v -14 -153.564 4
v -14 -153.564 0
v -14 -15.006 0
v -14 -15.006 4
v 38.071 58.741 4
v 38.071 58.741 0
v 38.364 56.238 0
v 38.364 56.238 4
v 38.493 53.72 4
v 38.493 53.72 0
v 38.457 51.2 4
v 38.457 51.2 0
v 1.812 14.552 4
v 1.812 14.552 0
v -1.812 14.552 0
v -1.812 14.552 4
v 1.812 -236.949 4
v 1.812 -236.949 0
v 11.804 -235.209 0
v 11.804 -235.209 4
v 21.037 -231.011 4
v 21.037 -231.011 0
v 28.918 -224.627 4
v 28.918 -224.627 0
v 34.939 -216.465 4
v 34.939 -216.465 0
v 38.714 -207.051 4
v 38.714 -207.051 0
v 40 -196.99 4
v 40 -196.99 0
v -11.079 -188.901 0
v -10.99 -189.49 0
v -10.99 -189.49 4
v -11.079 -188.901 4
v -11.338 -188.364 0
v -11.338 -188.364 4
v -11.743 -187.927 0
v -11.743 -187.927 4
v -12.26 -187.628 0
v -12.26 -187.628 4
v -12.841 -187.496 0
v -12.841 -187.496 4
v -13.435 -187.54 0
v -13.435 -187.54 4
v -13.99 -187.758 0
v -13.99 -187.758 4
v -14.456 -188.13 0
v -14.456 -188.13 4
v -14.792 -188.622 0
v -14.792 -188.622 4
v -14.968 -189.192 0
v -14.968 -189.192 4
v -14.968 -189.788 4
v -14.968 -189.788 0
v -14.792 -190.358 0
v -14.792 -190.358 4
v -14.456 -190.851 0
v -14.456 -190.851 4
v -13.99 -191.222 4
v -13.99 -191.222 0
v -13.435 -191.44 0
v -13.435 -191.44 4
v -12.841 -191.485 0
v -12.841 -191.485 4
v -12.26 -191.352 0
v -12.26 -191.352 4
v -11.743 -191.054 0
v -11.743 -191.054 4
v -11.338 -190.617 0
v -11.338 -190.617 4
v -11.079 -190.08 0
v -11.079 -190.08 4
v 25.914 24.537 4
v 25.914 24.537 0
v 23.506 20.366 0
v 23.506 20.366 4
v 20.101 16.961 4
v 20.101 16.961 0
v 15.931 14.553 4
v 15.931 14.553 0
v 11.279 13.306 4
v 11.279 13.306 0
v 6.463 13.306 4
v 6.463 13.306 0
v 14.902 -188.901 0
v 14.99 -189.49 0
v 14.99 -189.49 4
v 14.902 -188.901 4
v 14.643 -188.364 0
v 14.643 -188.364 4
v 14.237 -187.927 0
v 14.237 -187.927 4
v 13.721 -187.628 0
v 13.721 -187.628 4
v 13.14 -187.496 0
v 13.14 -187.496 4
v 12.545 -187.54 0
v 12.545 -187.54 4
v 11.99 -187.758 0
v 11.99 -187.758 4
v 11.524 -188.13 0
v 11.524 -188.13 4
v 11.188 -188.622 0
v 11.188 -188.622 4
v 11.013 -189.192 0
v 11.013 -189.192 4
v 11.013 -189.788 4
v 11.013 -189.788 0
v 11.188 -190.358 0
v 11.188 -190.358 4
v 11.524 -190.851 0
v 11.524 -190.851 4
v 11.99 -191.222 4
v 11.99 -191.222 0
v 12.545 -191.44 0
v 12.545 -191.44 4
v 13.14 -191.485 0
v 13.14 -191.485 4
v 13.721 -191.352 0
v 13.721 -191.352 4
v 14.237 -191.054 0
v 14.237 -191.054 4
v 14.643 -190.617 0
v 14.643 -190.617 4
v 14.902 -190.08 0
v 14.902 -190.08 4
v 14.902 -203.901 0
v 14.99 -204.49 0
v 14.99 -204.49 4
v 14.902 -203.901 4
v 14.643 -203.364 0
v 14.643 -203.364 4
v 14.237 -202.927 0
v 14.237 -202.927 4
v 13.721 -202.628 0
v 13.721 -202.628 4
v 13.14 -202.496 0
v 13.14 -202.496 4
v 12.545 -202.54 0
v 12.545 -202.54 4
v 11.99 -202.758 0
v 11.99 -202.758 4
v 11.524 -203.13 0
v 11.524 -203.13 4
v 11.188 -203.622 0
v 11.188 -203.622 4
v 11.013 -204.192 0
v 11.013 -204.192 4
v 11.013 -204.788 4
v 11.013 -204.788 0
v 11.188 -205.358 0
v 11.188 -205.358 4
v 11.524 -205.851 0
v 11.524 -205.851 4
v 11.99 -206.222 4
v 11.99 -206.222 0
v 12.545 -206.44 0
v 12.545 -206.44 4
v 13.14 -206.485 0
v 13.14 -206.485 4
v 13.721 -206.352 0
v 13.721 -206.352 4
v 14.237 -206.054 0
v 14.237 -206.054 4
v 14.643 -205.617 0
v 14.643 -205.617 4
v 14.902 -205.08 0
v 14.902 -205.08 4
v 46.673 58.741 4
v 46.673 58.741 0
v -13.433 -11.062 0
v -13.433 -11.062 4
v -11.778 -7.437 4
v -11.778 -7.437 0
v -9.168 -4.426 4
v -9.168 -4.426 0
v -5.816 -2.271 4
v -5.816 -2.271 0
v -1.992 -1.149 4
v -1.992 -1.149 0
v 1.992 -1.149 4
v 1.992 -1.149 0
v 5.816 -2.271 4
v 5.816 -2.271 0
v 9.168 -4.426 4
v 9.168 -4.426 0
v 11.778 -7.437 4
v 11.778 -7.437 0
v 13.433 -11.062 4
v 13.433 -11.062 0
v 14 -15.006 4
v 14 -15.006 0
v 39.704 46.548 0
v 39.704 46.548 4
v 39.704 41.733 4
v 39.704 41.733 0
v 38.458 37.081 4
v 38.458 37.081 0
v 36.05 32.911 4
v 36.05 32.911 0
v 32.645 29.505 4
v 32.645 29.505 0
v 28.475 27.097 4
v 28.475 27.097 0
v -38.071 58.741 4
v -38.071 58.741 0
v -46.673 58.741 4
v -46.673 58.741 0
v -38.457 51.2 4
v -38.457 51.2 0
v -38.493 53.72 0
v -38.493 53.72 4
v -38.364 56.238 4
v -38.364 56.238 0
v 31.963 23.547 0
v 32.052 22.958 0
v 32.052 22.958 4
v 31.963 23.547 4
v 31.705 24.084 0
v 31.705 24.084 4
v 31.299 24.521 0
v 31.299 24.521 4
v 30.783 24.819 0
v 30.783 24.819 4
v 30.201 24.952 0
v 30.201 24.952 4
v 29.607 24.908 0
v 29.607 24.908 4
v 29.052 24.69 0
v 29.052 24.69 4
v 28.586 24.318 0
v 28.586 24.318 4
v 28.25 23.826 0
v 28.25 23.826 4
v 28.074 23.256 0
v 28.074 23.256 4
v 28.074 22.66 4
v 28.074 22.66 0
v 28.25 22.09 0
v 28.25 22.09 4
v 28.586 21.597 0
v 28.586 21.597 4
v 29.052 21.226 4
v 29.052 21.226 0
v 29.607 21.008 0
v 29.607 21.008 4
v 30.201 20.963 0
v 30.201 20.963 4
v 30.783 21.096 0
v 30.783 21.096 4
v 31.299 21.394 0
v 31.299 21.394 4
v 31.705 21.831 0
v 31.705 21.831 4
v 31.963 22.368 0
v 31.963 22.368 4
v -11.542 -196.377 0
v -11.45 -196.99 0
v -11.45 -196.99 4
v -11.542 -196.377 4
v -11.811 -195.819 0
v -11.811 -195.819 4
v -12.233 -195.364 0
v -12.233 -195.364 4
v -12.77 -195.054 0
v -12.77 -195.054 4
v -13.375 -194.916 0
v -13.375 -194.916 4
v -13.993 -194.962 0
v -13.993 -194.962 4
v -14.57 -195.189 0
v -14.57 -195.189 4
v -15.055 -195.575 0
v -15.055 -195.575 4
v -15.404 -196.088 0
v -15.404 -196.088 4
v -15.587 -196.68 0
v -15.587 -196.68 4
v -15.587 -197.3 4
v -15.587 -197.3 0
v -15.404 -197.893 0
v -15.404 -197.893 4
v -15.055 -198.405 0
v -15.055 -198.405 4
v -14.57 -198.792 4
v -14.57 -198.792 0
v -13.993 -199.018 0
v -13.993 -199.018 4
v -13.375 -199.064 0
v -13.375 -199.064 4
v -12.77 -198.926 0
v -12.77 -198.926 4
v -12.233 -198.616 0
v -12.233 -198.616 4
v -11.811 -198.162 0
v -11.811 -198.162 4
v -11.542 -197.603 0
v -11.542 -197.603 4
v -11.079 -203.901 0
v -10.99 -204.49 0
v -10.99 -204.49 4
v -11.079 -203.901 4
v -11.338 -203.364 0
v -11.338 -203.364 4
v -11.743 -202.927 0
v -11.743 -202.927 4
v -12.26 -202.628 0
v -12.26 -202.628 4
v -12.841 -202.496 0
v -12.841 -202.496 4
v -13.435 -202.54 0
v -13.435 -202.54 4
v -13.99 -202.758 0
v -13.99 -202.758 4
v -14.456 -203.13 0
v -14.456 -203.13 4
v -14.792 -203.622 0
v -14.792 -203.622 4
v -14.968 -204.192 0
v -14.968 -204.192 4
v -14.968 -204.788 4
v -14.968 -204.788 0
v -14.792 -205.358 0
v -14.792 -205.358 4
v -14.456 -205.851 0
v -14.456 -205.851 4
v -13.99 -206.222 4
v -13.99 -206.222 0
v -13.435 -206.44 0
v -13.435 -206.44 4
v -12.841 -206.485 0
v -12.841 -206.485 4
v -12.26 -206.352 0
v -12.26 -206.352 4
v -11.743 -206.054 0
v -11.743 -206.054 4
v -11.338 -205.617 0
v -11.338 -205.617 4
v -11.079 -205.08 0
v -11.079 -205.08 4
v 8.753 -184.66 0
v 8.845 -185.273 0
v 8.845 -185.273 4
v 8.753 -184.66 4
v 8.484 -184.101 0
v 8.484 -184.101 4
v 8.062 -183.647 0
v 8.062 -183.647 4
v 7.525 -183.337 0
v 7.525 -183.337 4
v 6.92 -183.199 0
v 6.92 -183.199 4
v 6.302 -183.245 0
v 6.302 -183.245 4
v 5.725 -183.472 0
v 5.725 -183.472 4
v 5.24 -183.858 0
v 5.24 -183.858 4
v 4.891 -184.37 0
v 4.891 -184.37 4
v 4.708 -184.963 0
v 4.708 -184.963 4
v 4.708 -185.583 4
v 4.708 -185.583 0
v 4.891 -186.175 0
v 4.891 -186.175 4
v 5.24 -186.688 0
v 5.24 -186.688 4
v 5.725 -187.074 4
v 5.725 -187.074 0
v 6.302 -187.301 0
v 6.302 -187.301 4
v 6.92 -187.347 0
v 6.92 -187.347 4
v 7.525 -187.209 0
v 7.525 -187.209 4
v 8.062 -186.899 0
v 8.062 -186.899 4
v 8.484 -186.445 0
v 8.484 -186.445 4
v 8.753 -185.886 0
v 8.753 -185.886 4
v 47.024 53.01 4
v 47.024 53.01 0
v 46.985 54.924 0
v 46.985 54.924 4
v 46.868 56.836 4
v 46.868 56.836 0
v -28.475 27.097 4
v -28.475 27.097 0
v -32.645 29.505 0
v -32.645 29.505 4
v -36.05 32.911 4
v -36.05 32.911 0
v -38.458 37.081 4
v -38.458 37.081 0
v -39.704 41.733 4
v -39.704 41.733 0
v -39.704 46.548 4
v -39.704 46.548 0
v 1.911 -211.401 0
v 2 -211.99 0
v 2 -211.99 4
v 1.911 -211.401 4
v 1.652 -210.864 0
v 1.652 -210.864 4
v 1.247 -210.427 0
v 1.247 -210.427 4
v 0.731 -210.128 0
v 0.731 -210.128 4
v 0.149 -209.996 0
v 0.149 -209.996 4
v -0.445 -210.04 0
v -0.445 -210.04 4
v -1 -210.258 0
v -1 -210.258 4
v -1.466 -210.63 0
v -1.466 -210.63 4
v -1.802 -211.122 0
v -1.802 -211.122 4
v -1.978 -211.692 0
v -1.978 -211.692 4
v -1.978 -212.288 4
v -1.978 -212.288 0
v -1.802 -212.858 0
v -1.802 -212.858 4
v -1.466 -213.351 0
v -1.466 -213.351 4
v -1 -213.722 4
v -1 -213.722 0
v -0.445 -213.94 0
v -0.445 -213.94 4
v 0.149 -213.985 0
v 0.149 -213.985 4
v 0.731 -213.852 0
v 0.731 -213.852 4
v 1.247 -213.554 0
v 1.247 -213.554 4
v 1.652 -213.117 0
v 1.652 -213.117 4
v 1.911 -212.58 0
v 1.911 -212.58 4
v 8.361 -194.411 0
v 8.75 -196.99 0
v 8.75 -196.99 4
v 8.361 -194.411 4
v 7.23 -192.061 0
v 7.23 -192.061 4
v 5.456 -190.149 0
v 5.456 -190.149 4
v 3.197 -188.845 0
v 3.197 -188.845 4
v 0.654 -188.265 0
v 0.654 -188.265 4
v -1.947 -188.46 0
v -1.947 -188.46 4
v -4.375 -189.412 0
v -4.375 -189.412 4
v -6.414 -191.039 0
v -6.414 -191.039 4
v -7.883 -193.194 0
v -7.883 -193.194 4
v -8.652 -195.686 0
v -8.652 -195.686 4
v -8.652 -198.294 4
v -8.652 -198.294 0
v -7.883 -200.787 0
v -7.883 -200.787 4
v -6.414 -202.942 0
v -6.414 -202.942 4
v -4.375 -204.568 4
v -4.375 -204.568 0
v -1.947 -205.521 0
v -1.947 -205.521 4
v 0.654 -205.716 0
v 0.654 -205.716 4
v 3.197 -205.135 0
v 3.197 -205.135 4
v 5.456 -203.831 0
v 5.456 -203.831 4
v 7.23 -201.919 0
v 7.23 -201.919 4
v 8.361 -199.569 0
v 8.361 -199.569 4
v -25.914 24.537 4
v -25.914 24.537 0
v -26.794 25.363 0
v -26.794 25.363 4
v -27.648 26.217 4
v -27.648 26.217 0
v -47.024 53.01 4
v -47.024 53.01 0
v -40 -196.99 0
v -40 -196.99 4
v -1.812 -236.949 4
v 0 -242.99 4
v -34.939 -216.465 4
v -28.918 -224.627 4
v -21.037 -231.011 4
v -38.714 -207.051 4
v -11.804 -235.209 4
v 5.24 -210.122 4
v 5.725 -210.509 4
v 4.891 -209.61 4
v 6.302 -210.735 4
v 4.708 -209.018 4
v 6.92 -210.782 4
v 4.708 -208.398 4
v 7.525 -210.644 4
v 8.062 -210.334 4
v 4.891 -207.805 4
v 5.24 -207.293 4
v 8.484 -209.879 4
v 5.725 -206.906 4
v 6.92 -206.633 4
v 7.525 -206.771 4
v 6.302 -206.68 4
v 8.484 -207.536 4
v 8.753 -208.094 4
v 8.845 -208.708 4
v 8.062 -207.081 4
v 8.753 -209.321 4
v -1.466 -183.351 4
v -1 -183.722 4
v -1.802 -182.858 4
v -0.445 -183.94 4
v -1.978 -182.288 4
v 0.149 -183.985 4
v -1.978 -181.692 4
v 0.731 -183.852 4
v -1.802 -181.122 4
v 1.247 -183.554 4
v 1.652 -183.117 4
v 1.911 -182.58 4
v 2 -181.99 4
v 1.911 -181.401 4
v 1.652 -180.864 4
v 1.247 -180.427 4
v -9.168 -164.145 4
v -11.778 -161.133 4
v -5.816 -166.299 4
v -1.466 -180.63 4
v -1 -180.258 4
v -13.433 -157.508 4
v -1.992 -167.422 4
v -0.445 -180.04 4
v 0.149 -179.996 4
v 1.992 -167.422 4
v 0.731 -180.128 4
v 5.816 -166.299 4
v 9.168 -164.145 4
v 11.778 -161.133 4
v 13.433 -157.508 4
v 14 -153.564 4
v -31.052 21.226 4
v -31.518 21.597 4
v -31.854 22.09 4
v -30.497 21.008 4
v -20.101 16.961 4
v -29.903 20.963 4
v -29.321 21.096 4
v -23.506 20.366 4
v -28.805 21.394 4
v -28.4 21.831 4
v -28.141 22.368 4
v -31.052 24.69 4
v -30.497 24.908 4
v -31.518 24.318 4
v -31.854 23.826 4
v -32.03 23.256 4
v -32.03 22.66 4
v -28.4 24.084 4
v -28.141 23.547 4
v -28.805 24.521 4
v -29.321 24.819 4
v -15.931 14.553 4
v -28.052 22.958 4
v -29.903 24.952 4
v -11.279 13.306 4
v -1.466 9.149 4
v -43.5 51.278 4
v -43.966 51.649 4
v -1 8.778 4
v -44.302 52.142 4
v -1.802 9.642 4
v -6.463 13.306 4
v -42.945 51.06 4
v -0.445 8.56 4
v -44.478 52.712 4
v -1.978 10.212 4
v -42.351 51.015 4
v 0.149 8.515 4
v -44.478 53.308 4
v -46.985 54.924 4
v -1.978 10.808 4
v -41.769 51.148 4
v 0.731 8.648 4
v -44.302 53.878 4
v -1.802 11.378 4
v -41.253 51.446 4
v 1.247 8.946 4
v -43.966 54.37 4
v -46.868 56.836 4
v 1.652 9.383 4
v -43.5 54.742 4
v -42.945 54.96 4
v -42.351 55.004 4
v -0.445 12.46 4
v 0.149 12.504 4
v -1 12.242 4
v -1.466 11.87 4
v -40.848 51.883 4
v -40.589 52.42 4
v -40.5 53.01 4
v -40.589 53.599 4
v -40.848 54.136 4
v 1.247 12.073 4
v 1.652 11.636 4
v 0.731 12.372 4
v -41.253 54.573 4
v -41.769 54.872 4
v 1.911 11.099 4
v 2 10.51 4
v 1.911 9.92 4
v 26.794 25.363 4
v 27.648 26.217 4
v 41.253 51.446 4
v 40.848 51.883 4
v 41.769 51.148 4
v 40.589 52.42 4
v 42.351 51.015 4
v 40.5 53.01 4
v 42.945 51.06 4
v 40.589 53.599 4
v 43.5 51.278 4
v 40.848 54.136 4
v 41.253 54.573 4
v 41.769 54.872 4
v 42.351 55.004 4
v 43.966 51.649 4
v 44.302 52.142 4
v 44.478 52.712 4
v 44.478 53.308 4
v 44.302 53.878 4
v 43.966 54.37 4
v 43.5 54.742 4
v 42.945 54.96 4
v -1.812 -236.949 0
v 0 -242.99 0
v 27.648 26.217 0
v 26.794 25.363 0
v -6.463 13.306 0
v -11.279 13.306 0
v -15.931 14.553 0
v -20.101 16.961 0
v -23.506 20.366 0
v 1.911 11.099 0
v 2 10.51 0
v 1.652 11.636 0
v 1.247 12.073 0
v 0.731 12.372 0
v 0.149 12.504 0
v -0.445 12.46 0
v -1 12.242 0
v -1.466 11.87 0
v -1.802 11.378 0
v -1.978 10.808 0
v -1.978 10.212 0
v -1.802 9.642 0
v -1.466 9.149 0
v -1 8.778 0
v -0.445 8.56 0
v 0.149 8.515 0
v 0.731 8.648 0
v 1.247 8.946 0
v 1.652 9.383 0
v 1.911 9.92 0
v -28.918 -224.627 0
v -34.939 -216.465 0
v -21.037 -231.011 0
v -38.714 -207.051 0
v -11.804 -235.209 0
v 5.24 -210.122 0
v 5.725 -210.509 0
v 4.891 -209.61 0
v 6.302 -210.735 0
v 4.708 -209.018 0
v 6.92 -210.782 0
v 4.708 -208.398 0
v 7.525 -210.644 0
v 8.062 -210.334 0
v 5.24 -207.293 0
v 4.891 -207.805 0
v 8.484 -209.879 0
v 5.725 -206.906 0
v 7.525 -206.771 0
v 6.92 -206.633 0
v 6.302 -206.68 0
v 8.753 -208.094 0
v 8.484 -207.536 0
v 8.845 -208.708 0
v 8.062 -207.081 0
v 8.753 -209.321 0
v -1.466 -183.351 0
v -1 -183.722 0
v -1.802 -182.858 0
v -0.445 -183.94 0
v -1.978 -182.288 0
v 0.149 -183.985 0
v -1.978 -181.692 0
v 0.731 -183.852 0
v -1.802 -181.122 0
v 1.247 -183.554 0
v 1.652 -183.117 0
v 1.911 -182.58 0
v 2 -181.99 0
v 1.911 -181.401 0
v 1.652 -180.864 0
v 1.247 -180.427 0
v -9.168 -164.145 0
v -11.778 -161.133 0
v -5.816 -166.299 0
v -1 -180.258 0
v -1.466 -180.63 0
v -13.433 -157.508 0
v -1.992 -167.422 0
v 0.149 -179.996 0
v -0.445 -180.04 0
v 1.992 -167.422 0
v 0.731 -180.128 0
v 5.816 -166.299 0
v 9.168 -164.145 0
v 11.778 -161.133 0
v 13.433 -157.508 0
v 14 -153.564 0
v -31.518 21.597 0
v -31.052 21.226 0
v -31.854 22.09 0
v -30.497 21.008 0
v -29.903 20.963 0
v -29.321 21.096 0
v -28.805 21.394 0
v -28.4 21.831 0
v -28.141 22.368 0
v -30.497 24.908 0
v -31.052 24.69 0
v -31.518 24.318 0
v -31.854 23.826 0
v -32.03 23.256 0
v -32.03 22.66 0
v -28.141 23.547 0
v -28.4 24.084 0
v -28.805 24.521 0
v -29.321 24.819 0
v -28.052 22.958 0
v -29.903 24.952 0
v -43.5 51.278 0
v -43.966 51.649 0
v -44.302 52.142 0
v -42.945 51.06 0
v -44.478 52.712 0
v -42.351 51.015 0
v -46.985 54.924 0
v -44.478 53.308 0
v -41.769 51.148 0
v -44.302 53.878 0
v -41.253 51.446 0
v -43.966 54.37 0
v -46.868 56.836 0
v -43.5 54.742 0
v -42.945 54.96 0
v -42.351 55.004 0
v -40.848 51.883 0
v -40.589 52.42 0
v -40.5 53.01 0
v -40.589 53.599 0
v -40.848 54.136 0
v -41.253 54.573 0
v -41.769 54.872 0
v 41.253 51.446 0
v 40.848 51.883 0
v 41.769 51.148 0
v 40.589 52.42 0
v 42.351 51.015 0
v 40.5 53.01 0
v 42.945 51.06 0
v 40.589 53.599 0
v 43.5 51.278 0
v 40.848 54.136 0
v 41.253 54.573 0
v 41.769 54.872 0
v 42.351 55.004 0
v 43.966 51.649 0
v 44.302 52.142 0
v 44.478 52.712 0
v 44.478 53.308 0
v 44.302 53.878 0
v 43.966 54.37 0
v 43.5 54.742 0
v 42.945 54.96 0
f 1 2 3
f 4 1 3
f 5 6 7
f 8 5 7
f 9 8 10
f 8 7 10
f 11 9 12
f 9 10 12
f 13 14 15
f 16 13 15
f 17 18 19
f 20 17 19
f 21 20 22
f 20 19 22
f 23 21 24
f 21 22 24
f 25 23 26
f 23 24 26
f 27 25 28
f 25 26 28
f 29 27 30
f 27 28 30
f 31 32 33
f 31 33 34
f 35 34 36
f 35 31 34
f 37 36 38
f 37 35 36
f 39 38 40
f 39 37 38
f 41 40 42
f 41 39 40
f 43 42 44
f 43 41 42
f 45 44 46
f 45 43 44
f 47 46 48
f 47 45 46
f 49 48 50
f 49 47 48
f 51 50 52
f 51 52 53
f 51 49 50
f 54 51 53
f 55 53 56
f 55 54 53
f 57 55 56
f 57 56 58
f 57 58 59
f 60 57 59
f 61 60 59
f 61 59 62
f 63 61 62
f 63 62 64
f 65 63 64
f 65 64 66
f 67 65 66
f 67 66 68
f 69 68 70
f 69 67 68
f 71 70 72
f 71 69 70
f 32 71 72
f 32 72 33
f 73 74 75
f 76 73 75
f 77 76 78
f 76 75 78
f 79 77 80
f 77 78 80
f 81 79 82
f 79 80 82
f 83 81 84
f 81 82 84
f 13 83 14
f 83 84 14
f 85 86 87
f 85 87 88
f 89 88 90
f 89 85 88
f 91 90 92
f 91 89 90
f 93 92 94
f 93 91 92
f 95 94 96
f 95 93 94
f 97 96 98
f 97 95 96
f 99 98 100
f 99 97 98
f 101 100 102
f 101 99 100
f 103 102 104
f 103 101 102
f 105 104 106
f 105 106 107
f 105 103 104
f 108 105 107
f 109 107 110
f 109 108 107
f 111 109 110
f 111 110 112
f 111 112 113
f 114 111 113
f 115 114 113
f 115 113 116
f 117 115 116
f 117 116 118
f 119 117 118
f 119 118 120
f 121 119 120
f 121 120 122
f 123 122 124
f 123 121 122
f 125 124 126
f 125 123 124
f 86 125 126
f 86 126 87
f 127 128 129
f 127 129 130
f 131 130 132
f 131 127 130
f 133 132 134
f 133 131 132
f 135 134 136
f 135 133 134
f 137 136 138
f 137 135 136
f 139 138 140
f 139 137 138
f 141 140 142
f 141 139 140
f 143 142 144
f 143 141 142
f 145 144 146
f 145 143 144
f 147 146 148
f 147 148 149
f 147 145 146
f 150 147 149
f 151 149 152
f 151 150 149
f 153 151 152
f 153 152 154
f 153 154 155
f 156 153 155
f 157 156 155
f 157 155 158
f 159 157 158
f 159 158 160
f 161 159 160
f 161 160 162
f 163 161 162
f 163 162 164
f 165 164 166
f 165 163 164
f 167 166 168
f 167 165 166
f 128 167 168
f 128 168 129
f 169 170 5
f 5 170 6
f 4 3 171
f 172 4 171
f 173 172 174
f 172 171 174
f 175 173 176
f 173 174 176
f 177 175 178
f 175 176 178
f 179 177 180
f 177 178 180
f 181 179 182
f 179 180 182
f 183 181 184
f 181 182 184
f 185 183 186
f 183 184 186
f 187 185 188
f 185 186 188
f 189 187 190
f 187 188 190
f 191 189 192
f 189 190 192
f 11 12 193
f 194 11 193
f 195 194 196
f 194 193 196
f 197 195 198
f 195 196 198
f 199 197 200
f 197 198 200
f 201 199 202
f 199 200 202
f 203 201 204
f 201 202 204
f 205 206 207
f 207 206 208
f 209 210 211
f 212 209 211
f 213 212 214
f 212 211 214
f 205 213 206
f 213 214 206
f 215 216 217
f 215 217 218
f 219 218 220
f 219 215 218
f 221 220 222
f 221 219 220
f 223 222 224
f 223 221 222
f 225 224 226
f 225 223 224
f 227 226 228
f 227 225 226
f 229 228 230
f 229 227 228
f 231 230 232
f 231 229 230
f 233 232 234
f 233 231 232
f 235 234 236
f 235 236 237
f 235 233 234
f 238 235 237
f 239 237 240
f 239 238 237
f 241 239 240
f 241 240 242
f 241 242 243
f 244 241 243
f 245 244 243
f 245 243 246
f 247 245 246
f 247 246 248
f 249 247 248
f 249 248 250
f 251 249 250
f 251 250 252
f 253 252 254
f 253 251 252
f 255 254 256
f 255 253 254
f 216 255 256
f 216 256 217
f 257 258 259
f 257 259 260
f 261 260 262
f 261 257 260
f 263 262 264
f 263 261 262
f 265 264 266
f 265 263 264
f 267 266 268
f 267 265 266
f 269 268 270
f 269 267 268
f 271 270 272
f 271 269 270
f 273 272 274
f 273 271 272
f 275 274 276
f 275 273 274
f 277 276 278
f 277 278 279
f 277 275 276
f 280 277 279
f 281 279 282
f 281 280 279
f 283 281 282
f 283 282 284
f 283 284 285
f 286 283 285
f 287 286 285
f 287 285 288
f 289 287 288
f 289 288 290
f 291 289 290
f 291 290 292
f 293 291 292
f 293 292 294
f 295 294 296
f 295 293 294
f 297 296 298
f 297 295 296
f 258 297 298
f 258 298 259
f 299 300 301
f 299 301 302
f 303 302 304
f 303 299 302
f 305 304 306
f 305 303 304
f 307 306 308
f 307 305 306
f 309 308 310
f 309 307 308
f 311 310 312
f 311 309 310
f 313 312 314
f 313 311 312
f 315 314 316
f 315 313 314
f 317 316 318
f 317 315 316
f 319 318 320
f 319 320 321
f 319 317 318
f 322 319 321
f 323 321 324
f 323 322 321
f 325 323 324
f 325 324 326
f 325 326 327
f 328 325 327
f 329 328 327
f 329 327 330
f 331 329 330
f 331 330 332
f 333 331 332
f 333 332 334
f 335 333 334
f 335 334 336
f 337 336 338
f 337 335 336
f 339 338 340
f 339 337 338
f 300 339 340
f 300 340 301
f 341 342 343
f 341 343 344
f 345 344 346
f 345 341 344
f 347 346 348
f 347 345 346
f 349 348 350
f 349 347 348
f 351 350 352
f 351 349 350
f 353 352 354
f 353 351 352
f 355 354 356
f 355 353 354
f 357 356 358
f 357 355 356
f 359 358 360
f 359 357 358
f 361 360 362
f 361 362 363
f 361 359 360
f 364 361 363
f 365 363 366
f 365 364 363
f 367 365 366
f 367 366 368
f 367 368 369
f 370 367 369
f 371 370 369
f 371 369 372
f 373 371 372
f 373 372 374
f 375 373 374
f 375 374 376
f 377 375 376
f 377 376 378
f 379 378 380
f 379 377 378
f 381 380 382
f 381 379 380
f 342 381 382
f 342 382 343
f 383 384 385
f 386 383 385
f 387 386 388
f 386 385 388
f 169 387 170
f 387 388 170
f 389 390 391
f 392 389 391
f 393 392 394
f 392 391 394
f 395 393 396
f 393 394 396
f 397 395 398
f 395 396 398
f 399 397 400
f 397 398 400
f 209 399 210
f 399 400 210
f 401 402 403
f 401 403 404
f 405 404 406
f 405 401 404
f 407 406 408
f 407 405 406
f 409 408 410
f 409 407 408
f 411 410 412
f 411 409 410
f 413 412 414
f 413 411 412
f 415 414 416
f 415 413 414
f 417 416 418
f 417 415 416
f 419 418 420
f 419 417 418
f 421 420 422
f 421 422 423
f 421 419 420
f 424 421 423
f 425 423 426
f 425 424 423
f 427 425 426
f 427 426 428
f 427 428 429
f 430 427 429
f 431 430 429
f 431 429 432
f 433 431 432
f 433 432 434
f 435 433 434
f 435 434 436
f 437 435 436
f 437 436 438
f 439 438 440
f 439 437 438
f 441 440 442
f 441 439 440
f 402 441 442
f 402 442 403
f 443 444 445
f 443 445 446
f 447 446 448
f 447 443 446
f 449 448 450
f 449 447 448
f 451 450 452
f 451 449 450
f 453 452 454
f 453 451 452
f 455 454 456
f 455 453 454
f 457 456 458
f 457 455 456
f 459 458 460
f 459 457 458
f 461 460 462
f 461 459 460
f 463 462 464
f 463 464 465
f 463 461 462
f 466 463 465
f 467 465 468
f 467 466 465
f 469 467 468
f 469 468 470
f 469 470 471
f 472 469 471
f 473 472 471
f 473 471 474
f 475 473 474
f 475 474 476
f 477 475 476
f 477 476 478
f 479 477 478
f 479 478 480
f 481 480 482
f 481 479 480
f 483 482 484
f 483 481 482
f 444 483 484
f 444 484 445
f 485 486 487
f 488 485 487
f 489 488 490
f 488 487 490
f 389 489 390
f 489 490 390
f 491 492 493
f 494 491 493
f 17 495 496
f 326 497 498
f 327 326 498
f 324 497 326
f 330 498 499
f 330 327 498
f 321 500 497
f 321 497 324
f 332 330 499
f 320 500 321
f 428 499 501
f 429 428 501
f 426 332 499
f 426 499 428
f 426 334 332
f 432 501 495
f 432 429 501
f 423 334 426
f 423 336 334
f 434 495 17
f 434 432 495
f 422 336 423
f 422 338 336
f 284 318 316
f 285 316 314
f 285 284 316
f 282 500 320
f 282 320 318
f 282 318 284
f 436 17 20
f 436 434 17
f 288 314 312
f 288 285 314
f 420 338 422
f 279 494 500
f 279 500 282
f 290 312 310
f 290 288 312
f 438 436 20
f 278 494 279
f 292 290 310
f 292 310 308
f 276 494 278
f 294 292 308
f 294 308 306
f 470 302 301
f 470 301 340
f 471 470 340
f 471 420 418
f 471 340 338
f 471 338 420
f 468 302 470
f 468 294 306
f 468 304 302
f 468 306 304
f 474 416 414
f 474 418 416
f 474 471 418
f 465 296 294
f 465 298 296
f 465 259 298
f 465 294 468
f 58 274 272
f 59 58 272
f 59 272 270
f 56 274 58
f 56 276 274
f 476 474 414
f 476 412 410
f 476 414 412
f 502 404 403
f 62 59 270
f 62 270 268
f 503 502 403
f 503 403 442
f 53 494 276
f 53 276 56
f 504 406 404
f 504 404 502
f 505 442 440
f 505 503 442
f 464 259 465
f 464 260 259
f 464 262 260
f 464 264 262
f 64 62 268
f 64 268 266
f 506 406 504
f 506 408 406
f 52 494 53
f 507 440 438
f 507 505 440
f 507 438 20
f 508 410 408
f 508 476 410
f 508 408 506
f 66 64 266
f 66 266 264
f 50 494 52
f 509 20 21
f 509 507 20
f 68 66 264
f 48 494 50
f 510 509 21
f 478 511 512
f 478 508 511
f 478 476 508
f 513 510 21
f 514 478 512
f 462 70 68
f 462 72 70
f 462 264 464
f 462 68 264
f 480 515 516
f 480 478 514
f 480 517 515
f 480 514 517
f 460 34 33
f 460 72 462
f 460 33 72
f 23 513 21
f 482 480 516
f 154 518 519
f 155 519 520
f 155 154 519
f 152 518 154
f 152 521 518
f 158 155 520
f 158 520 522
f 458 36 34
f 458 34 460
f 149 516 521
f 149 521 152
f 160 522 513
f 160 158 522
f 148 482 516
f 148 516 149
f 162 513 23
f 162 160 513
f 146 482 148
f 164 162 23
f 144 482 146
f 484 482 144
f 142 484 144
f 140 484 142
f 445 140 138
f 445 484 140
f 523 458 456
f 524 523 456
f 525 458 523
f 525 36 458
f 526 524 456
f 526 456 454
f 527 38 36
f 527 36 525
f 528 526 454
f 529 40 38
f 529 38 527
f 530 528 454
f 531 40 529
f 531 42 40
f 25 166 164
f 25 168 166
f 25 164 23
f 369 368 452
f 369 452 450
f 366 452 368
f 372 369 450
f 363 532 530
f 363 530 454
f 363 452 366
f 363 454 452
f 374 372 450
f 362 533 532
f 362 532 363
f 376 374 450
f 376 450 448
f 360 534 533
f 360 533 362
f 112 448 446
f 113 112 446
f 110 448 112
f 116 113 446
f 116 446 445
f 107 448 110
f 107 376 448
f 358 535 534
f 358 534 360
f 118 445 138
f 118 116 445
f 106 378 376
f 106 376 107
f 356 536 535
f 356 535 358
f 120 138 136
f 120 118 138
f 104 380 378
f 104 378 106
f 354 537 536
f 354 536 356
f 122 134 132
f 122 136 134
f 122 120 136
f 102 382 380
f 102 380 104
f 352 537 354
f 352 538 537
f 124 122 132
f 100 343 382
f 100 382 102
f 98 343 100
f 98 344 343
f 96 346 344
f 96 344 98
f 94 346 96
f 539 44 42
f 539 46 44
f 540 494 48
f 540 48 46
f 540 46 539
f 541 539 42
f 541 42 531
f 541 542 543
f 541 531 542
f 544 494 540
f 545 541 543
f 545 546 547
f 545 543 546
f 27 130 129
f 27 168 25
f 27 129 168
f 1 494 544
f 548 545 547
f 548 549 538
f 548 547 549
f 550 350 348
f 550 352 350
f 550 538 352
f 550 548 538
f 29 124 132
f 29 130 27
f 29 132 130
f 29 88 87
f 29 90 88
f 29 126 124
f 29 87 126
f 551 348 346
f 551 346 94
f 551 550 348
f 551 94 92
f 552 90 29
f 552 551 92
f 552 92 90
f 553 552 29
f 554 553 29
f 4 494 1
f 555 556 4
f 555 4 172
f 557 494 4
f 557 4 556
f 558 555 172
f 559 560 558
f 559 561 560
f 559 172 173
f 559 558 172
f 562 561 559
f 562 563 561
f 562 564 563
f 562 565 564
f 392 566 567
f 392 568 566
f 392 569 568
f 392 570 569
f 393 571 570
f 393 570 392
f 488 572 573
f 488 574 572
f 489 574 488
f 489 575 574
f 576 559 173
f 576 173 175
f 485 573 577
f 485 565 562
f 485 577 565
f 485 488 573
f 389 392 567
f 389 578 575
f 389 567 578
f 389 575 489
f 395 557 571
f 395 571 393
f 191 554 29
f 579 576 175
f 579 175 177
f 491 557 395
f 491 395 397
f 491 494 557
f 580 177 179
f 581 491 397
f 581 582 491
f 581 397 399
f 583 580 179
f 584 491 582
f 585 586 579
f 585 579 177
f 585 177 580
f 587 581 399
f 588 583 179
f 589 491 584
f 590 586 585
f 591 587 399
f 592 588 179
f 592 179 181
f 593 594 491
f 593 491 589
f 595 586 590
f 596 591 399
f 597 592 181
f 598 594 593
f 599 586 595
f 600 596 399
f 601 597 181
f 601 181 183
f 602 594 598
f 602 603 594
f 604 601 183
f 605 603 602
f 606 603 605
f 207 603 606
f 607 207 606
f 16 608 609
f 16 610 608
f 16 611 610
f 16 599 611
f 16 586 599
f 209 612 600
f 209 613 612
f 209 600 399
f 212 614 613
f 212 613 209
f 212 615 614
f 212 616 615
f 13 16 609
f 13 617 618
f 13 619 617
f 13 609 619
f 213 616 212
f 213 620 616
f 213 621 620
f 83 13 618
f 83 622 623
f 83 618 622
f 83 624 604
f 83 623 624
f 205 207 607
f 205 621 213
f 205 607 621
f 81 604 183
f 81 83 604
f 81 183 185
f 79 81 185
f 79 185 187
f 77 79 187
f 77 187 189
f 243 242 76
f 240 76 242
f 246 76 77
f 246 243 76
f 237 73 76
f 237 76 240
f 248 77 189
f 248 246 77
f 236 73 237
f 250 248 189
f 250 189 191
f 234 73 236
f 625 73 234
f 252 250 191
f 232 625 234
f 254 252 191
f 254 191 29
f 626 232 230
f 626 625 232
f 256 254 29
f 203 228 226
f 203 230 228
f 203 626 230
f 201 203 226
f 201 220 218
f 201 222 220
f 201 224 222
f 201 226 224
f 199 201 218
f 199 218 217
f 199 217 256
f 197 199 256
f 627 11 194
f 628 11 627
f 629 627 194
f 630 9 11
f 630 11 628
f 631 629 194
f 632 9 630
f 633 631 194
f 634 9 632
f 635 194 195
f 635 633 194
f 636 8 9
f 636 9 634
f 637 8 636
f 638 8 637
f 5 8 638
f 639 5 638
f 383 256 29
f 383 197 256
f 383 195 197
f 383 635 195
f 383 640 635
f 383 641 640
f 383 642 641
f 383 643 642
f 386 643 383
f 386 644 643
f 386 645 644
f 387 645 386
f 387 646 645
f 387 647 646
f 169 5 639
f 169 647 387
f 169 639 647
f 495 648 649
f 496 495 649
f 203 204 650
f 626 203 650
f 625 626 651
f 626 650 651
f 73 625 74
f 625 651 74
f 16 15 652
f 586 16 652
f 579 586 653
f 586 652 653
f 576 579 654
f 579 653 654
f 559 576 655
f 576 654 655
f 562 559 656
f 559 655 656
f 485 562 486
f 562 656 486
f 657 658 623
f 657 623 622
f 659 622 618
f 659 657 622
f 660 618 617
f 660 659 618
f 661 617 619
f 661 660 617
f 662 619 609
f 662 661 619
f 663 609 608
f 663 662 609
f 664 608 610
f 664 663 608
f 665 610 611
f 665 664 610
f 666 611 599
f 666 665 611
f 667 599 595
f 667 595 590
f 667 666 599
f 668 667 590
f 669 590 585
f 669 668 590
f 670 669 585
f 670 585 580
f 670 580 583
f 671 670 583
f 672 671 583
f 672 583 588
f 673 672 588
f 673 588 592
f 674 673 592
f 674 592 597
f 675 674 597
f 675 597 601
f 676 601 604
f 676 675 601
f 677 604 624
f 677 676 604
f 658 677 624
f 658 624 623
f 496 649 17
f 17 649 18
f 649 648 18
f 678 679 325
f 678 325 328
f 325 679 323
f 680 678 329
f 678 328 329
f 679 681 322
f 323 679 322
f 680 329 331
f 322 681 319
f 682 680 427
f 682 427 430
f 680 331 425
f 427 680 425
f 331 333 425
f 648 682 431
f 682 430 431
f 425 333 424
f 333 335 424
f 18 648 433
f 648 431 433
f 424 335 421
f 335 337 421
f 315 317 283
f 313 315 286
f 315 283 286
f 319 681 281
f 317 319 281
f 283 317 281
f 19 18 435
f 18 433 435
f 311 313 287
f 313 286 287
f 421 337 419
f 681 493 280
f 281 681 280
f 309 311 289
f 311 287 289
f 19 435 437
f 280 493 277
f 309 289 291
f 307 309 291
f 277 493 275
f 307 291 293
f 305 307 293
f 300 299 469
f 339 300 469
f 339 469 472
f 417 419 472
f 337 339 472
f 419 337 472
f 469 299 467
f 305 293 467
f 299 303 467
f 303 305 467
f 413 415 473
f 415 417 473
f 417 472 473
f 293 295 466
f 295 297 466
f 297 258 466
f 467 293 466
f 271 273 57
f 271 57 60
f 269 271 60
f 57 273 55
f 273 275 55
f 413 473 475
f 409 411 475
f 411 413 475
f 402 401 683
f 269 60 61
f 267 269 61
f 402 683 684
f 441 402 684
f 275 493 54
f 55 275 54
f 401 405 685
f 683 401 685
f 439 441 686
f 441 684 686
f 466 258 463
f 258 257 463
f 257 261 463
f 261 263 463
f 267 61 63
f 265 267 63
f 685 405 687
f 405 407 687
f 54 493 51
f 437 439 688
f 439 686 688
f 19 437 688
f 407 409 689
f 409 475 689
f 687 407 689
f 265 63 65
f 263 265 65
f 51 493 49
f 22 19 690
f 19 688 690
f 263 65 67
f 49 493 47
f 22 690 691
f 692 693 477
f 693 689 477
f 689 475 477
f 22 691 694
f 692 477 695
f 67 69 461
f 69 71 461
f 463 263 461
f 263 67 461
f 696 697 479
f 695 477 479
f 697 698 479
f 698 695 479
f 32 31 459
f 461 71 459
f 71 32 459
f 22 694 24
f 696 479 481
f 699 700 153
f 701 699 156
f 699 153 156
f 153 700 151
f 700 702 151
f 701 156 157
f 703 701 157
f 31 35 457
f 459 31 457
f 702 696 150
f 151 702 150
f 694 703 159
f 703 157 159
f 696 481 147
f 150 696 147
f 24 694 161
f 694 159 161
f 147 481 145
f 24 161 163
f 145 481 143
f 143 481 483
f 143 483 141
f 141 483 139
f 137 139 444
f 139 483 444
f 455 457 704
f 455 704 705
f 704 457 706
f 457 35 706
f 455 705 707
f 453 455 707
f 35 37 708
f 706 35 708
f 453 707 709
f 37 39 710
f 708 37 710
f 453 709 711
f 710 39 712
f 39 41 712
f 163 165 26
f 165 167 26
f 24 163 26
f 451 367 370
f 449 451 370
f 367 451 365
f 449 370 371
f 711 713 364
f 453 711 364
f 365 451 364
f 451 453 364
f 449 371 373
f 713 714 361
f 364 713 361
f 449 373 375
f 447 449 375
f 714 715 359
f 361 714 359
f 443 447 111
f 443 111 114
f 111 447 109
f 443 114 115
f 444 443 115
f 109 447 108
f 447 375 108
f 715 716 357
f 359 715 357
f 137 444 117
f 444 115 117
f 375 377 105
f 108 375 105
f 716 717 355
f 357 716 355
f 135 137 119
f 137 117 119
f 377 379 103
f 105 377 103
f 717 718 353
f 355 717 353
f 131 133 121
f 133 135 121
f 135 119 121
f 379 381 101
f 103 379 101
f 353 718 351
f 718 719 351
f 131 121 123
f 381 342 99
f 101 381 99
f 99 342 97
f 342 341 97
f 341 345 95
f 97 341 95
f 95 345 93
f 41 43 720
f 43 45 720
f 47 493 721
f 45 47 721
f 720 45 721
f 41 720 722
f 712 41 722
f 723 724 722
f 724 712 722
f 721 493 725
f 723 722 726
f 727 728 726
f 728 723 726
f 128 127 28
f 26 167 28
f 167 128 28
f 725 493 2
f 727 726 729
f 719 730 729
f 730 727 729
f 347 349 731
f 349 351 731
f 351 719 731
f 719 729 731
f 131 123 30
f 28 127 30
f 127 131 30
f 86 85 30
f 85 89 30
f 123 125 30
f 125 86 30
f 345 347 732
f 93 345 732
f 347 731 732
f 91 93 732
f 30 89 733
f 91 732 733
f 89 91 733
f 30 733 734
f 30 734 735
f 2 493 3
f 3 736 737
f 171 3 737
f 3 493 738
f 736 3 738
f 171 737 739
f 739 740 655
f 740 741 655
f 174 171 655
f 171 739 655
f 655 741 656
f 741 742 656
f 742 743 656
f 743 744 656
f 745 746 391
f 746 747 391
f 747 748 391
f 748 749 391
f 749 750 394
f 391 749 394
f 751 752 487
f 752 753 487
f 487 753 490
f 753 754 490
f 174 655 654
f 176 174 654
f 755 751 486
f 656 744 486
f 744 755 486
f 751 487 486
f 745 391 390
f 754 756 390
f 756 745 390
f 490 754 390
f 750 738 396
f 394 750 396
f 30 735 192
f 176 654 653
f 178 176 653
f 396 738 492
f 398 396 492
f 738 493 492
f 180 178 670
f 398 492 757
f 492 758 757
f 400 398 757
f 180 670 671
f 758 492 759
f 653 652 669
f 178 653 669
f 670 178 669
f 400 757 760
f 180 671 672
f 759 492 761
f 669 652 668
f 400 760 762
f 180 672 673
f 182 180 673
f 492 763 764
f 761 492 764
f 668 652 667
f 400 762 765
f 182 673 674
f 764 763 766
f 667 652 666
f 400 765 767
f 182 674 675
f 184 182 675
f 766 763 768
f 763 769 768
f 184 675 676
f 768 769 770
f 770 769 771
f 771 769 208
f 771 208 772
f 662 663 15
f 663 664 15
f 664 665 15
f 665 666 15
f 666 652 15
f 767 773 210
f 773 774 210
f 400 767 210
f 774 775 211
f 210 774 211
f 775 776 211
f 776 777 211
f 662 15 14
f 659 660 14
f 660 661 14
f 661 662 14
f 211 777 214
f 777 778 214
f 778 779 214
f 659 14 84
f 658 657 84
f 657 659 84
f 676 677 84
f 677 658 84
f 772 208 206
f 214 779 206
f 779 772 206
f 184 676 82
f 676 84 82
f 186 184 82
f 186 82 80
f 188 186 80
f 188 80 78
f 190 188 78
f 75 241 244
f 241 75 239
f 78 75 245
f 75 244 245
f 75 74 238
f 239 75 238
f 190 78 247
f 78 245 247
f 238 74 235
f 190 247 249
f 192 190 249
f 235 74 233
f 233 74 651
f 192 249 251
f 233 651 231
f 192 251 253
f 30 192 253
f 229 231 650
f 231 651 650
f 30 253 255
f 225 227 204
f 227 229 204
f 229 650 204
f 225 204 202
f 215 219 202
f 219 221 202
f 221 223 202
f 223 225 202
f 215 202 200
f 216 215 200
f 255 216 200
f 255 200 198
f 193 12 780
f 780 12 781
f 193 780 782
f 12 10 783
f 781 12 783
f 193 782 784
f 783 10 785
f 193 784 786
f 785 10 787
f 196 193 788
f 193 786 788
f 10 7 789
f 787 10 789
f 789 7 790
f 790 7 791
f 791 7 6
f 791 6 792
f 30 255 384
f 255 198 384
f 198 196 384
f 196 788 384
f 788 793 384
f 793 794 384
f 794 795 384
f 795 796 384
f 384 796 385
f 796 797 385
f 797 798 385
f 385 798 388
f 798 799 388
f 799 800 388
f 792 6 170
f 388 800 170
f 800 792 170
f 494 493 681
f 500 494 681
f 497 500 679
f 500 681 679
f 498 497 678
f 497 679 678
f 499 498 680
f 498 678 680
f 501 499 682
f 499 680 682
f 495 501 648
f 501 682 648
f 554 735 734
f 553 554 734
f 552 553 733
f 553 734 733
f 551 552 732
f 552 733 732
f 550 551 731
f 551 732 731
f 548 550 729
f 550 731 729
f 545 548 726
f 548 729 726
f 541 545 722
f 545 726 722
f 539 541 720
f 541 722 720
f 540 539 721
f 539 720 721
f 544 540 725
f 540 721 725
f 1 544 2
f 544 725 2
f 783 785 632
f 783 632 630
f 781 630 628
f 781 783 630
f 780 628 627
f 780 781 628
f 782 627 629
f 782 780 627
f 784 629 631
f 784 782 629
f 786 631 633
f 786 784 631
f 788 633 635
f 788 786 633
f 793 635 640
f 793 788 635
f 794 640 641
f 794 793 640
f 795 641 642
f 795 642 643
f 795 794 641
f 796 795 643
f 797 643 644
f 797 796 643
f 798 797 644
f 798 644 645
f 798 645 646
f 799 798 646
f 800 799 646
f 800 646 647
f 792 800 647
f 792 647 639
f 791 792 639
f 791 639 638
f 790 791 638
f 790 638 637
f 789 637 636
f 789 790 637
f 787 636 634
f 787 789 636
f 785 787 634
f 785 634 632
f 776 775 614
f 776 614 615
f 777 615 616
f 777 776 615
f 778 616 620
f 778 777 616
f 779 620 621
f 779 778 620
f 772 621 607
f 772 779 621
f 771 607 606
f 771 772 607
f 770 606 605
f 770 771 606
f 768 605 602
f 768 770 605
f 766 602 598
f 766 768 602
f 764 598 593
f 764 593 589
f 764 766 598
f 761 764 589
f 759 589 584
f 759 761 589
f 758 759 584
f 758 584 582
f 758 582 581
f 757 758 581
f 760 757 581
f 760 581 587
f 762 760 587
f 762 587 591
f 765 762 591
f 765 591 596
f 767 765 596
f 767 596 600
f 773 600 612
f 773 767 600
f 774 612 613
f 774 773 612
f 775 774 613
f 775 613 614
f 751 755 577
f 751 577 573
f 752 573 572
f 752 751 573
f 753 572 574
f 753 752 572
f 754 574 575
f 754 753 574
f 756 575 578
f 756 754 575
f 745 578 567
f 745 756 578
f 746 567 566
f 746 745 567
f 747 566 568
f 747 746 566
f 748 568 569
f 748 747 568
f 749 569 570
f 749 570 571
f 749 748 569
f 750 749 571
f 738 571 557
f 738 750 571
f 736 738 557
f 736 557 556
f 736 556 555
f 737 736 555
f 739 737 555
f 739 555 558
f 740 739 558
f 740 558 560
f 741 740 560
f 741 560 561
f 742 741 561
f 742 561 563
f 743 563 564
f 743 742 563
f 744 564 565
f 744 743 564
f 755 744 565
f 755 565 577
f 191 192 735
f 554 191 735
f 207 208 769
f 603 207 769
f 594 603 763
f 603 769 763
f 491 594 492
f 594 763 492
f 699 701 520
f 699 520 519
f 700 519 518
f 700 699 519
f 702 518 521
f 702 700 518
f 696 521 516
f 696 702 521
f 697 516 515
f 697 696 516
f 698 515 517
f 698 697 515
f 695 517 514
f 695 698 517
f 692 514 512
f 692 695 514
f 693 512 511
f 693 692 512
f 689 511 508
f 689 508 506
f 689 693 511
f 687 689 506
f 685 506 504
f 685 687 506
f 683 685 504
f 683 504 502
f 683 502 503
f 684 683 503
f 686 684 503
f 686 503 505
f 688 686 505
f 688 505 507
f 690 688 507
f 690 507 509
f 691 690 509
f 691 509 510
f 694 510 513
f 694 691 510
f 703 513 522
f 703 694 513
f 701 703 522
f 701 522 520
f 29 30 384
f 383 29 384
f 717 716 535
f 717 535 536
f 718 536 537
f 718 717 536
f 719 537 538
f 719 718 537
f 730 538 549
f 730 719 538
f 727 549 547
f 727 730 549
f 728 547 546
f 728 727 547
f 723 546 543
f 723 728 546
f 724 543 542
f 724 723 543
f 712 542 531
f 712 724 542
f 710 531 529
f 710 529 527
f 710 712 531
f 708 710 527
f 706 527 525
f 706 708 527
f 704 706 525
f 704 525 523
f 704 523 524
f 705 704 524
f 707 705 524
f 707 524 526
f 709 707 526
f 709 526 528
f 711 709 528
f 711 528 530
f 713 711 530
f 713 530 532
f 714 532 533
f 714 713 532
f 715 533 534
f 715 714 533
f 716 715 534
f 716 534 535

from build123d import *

# Parameters (mm, degrees)
SKETCH_3_R      = 2
SKETCH_3_R_2    = 2.08
SKETCH_3_R_3    = 8.75
EXTRUDE_1_DEPTH = 4


with BuildPart() as part:
    # 草图3 → 凸台-拉伸1 (new body)
    with BuildSketch(Plane.XY):
        with BuildLine():
            Line((-38.071041638, 58.740907862), (-46.673377973, 58.740907862))
            ThreePointArc((-46.673377973, 58.740907862), (-46.936210234, 55.880701084), (-47.023930078, 53.009783315))
            Line((-47.023930078, 53.009783315), (-40, -196.990216688))
            ThreePointArc((-40, -196.990216688), (-28.917733212, -224.626509961), (-1.811764706, -236.94916448))
            Line((-1.811764706, -236.94916448), (0, -242.990216688))
            Line((0, -242.990216688), (1.811764706, -236.94916448))
            ThreePointArc((1.811764706, -236.94916448), (28.917733212, -224.626509961), (40, -196.990216688))
            Line((40, -196.990216688), (47.023930078, 53.009783315))
            ThreePointArc((47.023930078, 53.009783315), (46.936210234, 55.880701084), (46.673377973, 58.740907862))
            Line((46.673377973, 58.740907862), (38.071041638, 58.740907862))
            ThreePointArc((38.071041638, 58.740907862), (38.449556599, 54.979960288), (38.457440916, 51.200021389))
            ThreePointArc((38.457440916, 51.200021389), (38.457808554, 37.081210633), (28.474561686, 27.097443846))
            ThreePointArc((28.474561686, 27.097443846), (27.22431994, 25.786881122), (25.913822328, 24.536571126))
            ThreePointArc((25.913822328, 24.536571126), (15.93057546, 14.552804338), (1.811764704, 14.5524367))
            Line((1.811764704, 14.5524367), (-1.811764704, 14.5524367))
            ThreePointArc((-1.811764704, 14.5524367), (-15.93057546, 14.552804338), (-25.913822328, 24.536571126))
            ThreePointArc((-25.913822328, 24.536571126), (-27.22431994, 25.786881122), (-28.474561686, 27.097443846))
            ThreePointArc((-28.474561686, 27.097443846), (-38.457808554, 37.081210633), (-38.457440916, 51.200021389))
            ThreePointArc((-38.457440916, 51.200021389), (-38.449556599, 54.979960288), (-38.071041638, 58.740907862))
        make_face()
        with Locations((0, 10.509783315)):
            Circle(SKETCH_3_R, mode=Mode.SUBTRACT)
        with Locations((-30.0520382, 22.957745114)):
            Circle(SKETCH_3_R, mode=Mode.SUBTRACT)
        with Locations((-42.5, 53.009783315)):
            Circle(SKETCH_3_R, mode=Mode.SUBTRACT)
        with Locations((30.0520382, 22.957745114)):
            Circle(SKETCH_3_R, mode=Mode.SUBTRACT)
        with Locations((0, -211.990216688)):
            Circle(SKETCH_3_R, mode=Mode.SUBTRACT)
        with Locations((-12.990381057, -204.490216688)):
            Circle(SKETCH_3_R, mode=Mode.SUBTRACT)
        with Locations((-12.990381057, -189.490216688)):
            Circle(SKETCH_3_R, mode=Mode.SUBTRACT)
        with Locations((0, -181.990216688)):
            Circle(SKETCH_3_R, mode=Mode.SUBTRACT)
        with Locations((12.990381057, -189.490216688)):
            Circle(SKETCH_3_R, mode=Mode.SUBTRACT)
        with Locations((12.990381057, -204.490216688)):
            Circle(SKETCH_3_R, mode=Mode.SUBTRACT)
        with Locations((-13.53, -196.990216688)):
            Circle(SKETCH_3_R_2, mode=Mode.SUBTRACT)
        with Locations((6.765, -185.272892975)):
            Circle(SKETCH_3_R_2, mode=Mode.SUBTRACT)
        with Locations((6.765, -208.707540401)):
            Circle(SKETCH_3_R_2, mode=Mode.SUBTRACT)
        with Locations((0, -196.990216688)):
            Circle(SKETCH_3_R_3, mode=Mode.SUBTRACT)
        with Locations(Location((42.5, 53.009783315, 0), (0, 0, 180))):
            Circle(SKETCH_3_R, mode=Mode.SUBTRACT)
        with BuildLine():
            Line((-14, -153.564151609), (-14, -15.006038041))
            ThreePointArc((-14, -15.006038041), (0, -1.006038041), (14, -15.006038041))
            Line((14, -15.006038041), (14, -153.564151609))
            ThreePointArc((14, -153.564151609), (0, -167.564151609), (-14, -153.564151609))
        make_face(mode=Mode.SUBTRACT)
    extrude(amount=EXTRUDE_1_DEPTH)


solid = part.part
